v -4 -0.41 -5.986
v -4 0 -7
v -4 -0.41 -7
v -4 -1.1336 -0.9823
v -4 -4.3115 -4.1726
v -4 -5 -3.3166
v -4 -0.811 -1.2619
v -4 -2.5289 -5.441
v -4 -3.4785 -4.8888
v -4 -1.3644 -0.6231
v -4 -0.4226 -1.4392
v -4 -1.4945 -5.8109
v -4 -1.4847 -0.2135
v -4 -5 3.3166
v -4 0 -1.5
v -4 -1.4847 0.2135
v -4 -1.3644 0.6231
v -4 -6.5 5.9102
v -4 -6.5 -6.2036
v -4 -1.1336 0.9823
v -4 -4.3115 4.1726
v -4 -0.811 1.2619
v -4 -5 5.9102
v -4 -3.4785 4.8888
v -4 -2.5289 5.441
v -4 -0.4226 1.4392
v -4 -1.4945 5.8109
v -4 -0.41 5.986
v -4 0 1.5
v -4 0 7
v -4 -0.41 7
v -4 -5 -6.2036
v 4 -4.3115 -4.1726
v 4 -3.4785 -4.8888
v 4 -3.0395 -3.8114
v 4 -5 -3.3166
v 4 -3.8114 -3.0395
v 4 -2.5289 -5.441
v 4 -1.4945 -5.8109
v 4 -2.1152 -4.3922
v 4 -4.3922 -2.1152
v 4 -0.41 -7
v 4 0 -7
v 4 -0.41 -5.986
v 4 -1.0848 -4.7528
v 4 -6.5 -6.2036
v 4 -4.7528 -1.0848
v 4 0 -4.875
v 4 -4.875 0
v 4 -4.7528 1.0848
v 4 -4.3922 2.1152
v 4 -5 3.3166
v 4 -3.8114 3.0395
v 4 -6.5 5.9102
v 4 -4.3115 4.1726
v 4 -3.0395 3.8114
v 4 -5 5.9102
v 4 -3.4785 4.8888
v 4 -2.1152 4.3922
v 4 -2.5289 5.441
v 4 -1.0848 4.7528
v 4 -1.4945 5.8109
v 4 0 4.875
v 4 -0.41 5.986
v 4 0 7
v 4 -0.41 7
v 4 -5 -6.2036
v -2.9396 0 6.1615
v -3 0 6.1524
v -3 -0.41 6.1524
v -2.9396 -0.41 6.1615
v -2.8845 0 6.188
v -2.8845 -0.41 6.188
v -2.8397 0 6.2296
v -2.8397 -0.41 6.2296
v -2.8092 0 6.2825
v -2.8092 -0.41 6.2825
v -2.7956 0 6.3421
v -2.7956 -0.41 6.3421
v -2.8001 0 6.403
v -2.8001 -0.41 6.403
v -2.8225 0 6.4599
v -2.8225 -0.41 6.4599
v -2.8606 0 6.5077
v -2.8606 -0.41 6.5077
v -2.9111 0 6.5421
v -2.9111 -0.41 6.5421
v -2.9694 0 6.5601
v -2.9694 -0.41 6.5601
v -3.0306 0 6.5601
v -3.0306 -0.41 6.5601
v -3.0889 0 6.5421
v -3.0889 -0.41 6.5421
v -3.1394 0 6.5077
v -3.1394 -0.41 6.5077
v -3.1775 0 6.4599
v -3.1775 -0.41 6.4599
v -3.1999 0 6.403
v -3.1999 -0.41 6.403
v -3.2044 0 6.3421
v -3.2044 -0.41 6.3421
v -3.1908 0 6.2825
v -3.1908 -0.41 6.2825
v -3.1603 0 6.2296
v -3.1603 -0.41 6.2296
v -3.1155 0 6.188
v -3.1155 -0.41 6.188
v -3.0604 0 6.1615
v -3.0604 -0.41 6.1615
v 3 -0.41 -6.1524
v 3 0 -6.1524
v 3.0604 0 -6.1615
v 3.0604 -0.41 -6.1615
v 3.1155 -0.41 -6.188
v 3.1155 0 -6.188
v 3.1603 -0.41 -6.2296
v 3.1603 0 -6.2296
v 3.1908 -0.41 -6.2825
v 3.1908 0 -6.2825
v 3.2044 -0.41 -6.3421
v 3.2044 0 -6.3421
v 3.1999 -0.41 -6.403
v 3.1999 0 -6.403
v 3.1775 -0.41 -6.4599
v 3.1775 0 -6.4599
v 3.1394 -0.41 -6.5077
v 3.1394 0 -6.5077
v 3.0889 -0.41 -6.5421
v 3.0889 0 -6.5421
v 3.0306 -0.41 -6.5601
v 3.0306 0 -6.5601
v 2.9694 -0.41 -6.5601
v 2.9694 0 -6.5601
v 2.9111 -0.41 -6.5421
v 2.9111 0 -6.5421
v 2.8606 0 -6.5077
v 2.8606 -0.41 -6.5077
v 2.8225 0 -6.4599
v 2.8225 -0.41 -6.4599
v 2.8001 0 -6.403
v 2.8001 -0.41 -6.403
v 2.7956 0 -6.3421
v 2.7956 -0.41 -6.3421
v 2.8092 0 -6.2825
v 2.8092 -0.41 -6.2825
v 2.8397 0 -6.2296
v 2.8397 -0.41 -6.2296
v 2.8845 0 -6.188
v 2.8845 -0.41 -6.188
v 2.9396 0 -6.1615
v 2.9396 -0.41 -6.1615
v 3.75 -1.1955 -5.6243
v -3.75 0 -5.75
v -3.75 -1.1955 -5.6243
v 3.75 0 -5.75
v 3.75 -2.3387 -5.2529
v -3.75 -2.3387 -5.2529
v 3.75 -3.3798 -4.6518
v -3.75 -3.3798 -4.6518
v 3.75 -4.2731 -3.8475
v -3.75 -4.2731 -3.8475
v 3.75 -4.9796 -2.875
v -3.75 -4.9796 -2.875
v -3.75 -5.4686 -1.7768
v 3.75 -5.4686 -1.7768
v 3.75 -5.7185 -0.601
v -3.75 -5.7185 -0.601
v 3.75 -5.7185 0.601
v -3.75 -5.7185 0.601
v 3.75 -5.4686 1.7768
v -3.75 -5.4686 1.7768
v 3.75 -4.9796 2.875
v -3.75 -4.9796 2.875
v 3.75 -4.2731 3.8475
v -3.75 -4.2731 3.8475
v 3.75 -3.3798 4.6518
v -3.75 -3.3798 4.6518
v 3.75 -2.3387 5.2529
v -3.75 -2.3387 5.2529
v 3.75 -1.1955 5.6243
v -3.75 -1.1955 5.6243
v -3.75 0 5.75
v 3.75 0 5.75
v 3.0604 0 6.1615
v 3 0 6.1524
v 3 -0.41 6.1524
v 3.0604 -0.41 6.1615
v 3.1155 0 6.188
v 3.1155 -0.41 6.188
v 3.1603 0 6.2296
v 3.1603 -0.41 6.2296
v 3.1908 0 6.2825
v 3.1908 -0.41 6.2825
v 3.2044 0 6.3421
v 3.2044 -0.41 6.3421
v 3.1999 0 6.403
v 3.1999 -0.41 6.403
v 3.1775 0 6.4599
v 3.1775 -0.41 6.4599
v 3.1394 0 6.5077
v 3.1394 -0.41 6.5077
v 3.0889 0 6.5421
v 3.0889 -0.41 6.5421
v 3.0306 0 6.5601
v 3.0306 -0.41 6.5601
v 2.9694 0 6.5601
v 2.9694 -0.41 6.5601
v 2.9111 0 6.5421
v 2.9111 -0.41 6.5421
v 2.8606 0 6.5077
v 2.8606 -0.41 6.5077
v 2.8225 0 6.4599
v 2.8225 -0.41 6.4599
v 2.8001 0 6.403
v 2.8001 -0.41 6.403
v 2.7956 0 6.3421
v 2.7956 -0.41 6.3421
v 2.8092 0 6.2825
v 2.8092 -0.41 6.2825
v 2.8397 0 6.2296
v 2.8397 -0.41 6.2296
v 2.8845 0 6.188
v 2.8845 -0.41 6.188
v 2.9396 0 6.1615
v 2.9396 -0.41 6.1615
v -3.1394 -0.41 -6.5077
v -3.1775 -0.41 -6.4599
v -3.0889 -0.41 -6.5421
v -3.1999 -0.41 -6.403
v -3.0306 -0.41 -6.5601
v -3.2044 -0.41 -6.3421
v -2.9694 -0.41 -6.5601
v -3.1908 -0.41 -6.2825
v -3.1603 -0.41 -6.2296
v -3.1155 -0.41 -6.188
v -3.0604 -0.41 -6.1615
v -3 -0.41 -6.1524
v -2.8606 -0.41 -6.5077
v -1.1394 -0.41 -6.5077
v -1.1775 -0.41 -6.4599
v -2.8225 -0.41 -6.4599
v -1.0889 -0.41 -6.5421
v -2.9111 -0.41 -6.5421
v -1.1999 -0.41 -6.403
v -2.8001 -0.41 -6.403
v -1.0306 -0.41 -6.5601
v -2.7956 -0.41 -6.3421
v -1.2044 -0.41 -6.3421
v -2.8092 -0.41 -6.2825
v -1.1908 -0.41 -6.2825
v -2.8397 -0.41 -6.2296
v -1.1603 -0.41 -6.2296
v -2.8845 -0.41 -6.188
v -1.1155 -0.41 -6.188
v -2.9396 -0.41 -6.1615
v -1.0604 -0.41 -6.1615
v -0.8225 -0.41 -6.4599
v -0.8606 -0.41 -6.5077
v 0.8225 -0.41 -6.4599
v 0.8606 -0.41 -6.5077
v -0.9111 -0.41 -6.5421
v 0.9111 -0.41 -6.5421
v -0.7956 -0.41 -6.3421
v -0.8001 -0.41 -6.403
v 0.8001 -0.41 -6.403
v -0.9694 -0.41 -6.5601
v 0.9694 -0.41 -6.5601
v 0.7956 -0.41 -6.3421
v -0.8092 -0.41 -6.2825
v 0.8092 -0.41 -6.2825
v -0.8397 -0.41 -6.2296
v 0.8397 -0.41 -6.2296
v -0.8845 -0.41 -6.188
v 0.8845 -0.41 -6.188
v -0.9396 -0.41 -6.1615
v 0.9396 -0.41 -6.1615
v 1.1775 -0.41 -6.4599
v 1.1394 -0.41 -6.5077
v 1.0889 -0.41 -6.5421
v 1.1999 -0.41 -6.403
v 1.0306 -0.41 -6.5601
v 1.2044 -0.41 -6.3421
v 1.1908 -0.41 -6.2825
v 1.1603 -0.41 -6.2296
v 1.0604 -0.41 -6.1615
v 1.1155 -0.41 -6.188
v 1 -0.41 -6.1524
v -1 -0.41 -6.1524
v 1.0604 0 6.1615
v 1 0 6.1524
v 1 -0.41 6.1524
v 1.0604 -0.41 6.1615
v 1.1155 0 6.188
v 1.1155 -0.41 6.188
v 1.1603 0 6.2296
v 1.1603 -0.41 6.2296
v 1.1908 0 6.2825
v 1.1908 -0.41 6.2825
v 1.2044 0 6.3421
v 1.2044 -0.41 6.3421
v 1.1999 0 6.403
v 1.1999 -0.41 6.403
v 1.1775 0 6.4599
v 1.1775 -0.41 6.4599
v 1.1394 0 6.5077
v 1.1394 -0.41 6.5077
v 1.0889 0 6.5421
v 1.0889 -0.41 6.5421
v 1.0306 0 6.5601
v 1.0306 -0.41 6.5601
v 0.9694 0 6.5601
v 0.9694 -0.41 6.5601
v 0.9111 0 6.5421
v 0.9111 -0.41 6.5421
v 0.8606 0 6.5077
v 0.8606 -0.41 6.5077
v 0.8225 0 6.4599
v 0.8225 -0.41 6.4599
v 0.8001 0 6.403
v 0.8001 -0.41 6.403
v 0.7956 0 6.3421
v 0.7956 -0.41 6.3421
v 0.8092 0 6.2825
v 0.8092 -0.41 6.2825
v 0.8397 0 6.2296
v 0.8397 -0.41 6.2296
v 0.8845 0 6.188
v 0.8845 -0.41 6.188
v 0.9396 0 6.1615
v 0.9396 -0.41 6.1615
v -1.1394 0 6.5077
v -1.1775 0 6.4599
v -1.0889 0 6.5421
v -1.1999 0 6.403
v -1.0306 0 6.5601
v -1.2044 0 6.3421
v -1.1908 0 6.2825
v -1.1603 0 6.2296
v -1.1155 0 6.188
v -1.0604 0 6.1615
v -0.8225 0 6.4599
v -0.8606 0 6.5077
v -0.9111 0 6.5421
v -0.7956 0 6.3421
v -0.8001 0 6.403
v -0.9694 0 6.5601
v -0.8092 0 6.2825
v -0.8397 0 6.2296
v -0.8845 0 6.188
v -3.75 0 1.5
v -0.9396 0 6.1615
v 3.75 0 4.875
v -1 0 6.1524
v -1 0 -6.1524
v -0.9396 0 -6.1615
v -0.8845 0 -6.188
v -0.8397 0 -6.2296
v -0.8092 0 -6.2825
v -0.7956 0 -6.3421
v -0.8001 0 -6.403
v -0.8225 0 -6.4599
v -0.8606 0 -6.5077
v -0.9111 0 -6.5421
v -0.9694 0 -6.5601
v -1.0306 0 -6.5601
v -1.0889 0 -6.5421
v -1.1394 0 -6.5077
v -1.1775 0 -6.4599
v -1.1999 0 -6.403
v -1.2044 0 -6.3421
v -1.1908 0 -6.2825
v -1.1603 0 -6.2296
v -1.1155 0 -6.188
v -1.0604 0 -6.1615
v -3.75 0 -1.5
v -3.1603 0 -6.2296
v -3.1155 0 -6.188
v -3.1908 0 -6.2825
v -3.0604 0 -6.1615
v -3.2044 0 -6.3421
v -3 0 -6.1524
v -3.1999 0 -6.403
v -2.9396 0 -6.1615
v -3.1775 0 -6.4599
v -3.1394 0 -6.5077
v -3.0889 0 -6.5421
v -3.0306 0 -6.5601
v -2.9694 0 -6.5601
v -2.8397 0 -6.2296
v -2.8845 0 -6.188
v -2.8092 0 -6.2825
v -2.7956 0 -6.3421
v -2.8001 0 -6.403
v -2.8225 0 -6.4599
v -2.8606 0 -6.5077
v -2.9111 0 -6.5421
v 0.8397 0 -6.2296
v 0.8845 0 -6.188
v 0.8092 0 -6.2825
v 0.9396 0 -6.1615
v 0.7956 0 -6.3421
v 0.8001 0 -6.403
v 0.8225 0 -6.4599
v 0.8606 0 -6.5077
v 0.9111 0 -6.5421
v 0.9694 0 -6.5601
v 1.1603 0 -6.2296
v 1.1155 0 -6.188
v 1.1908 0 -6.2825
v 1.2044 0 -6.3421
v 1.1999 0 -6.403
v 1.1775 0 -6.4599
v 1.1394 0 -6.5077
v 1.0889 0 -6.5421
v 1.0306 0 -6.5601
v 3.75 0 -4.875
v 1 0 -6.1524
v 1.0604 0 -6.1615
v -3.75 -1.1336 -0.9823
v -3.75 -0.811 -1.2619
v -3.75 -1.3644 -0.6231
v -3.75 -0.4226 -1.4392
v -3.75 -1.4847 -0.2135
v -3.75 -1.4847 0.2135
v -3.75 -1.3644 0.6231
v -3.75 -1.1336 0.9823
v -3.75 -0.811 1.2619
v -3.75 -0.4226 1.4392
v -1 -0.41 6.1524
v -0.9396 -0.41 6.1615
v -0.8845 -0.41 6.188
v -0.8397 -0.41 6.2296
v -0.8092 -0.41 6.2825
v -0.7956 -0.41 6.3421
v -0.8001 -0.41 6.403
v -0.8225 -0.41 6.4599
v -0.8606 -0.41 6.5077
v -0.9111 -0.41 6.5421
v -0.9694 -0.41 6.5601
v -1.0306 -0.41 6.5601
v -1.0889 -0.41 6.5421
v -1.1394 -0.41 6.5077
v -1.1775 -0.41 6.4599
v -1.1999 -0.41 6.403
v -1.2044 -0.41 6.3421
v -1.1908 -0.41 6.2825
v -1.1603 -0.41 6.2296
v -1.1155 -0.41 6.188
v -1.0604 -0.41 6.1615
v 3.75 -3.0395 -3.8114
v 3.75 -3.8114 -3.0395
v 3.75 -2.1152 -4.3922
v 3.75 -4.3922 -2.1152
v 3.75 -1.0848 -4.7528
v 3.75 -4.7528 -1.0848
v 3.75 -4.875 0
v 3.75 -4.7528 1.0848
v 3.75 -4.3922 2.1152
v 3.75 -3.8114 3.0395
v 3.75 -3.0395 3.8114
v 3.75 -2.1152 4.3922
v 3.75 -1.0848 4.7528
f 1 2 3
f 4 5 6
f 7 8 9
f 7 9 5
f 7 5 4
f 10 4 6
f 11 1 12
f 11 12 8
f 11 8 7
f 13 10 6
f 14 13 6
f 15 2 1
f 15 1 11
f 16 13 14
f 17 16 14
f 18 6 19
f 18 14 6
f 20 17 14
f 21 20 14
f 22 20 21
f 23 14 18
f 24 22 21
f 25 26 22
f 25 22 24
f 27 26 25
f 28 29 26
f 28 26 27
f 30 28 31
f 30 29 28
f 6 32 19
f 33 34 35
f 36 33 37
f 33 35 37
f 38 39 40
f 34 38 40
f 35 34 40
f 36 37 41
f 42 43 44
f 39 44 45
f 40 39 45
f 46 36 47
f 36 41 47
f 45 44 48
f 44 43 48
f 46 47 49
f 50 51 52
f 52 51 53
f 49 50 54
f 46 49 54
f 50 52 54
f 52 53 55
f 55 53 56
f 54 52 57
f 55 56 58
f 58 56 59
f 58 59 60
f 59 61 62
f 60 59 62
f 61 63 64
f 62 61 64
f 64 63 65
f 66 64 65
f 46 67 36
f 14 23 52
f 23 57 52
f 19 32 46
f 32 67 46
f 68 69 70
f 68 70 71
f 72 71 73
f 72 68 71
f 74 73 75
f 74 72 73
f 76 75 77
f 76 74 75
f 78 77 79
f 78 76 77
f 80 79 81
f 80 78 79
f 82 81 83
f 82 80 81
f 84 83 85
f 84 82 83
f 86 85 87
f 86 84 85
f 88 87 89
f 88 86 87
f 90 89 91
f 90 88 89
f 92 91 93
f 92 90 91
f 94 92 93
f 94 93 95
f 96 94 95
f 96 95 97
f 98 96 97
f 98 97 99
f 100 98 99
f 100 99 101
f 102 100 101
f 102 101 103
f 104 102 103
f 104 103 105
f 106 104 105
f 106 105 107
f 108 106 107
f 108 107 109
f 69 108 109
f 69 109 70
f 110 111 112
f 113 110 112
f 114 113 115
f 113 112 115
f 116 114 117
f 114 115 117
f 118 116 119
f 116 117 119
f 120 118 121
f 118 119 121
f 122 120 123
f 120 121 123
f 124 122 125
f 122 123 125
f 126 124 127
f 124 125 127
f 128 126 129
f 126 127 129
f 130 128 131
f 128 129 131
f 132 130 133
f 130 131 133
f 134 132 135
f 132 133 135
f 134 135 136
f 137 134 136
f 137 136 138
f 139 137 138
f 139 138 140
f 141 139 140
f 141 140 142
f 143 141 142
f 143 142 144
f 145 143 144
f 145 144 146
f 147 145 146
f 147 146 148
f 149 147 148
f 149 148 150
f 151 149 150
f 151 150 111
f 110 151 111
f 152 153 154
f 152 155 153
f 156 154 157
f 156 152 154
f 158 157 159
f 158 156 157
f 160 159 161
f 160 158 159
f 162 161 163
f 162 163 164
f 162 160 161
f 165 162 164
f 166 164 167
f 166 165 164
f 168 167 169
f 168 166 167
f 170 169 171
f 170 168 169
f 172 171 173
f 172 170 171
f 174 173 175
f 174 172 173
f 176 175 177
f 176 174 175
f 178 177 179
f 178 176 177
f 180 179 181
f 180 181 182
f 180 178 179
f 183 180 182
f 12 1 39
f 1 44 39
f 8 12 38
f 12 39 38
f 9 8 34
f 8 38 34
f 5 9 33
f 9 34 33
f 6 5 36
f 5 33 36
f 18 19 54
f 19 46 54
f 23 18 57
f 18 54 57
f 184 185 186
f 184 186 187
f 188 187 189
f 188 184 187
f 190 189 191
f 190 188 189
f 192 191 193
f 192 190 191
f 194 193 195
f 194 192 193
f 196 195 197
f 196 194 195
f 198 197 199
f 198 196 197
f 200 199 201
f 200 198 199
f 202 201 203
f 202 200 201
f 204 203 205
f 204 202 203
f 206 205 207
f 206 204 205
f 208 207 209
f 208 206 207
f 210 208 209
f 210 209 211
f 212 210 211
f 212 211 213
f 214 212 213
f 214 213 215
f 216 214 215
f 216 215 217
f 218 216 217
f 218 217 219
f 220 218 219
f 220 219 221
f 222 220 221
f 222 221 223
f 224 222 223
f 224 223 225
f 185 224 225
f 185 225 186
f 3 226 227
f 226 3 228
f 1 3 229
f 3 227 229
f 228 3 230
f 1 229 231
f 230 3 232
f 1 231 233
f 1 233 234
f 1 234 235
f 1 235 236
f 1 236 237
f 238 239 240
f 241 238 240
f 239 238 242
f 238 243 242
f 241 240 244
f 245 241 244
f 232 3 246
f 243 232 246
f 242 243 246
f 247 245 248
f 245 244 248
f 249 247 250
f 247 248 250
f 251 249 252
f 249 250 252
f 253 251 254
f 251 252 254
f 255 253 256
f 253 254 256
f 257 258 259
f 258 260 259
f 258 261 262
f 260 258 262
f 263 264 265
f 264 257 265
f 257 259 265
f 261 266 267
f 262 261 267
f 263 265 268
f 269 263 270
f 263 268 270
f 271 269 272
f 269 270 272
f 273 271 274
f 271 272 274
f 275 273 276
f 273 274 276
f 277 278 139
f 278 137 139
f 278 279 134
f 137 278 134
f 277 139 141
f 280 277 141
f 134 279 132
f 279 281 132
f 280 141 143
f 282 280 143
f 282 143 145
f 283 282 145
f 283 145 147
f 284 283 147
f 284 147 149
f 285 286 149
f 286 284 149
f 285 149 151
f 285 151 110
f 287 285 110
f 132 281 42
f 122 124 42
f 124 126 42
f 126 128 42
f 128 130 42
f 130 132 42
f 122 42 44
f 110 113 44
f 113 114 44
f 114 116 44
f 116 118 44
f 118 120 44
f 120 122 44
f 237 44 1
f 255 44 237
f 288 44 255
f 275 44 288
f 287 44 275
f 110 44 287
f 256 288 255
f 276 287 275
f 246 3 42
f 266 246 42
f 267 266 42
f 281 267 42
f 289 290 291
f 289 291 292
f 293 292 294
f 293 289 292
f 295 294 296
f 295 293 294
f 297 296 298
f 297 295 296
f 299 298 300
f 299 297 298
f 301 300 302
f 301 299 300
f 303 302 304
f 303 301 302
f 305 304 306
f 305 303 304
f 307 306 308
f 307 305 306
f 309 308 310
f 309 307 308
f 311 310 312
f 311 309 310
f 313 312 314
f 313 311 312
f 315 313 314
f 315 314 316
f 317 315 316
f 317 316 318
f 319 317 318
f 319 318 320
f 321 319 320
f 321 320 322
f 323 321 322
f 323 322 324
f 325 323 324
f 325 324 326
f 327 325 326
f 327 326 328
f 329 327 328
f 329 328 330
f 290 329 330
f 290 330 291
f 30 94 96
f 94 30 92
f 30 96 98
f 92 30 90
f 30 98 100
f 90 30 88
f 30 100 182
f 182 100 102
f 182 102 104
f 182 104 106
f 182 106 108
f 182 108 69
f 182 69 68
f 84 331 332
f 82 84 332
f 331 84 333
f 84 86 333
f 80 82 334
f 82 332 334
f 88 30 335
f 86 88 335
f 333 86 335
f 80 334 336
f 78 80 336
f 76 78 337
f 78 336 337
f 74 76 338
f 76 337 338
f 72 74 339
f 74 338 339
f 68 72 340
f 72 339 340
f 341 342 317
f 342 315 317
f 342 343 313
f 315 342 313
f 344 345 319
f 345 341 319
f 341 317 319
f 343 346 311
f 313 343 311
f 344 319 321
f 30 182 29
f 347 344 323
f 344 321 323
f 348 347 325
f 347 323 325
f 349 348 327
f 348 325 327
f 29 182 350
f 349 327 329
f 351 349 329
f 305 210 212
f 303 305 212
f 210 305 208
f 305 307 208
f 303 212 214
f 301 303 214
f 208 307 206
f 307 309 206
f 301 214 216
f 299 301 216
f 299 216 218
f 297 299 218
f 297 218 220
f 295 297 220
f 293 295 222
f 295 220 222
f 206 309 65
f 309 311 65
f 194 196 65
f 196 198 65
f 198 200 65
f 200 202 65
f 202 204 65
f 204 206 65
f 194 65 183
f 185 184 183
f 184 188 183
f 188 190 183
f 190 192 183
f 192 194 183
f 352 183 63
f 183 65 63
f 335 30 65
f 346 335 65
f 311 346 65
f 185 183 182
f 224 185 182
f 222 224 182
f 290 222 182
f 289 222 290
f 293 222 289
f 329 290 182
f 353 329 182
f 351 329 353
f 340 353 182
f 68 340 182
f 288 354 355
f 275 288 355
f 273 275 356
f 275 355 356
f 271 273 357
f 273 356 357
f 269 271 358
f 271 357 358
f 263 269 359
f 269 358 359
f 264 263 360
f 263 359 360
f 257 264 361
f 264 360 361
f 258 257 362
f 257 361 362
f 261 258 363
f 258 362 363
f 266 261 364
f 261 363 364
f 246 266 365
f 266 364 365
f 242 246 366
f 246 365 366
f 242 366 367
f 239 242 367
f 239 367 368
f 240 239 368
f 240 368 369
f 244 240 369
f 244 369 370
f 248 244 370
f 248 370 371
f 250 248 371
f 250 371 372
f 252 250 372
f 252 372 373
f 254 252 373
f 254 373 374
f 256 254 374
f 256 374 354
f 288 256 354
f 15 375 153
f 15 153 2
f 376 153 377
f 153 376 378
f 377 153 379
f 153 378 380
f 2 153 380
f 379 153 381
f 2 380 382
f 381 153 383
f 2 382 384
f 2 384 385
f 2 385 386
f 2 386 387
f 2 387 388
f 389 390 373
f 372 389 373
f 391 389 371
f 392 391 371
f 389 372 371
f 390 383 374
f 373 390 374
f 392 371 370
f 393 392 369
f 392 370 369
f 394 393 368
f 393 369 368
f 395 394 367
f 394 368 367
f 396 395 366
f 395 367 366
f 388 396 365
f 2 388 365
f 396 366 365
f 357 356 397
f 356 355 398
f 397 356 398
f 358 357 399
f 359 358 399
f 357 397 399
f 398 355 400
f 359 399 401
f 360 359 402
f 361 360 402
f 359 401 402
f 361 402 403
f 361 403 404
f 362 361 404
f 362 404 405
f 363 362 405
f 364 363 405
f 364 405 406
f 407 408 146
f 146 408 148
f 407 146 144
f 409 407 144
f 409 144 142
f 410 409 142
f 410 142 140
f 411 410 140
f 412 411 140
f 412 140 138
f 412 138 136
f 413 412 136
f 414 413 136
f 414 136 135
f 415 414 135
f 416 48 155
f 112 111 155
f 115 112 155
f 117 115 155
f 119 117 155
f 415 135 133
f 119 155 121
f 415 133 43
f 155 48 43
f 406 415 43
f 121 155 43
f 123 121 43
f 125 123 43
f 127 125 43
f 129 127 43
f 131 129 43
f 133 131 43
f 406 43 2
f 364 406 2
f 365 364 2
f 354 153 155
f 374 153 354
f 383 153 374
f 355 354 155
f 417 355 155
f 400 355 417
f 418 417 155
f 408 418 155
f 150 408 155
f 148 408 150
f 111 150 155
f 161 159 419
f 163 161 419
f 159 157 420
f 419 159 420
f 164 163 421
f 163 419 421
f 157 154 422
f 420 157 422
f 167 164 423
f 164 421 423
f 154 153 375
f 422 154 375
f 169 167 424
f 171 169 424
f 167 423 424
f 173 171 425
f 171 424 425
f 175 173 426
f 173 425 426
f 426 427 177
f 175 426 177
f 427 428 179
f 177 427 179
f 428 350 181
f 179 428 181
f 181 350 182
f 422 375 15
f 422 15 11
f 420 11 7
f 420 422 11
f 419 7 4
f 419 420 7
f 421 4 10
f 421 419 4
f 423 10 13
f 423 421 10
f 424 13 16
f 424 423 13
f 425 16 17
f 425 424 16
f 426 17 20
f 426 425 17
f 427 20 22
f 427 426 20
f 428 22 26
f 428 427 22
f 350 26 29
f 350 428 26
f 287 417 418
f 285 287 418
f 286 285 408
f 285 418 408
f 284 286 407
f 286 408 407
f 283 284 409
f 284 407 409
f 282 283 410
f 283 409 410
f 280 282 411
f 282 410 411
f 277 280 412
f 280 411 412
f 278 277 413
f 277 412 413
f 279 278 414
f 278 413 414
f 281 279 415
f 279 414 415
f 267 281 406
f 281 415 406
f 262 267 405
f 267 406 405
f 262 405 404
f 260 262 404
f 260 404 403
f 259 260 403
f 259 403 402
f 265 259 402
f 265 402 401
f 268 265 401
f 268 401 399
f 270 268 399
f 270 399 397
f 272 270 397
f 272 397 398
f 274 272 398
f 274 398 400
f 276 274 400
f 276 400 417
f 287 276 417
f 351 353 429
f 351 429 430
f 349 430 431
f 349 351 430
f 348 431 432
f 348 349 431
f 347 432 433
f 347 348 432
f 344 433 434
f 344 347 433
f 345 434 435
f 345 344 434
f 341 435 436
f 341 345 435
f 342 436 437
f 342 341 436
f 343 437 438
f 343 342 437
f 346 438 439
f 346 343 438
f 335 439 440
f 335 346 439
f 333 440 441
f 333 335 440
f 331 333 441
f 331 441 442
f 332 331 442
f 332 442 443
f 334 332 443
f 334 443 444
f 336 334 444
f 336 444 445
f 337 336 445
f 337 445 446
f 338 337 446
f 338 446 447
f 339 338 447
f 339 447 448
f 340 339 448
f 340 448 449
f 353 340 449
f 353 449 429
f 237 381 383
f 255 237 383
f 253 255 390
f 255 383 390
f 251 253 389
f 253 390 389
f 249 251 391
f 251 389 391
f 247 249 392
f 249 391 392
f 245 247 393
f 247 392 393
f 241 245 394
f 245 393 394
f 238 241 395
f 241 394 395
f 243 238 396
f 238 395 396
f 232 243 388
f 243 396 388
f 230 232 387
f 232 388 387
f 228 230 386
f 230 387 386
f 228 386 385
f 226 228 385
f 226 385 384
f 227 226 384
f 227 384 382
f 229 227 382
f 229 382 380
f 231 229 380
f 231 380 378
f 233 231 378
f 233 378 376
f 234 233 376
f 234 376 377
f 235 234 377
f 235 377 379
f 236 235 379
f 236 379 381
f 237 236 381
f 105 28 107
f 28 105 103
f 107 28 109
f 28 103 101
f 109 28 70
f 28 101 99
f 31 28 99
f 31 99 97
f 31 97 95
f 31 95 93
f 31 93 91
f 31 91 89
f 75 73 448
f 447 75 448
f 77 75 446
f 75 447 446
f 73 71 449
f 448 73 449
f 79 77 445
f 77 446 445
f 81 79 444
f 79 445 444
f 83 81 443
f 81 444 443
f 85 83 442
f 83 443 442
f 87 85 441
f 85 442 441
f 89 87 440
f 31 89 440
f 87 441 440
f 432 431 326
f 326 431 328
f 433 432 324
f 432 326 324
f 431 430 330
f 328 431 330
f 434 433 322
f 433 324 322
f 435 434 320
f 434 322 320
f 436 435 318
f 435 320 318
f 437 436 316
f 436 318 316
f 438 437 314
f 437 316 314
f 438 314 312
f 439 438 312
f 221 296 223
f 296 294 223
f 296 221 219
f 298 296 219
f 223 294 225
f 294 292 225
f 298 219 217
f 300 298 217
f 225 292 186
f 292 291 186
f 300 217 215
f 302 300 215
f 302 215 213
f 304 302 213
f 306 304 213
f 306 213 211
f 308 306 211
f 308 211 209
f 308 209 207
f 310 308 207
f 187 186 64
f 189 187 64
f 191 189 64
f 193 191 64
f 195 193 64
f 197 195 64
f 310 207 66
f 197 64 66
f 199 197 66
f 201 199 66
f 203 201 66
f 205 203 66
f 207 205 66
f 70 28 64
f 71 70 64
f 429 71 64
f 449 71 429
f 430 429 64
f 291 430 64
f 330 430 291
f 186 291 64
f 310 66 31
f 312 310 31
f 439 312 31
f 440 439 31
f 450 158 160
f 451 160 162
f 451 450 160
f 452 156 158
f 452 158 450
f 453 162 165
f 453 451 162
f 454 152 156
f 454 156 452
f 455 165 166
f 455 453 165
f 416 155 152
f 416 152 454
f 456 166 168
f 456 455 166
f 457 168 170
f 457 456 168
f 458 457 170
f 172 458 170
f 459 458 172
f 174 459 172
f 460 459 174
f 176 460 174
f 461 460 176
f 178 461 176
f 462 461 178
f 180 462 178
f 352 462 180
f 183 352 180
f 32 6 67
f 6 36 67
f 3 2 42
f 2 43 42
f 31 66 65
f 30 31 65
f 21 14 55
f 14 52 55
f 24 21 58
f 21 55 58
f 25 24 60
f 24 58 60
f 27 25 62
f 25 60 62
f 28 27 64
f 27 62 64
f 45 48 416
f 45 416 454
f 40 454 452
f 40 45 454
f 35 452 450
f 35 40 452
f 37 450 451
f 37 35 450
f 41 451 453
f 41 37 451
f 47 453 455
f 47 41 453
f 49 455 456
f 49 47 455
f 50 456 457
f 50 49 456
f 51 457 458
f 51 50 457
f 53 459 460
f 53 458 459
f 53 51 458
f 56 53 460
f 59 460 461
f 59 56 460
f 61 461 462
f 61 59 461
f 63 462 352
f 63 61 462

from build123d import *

# Parameters (mm, degrees)
BOSS_EXTRUDE1_DEPTH = 4
CUT_EXTRUDE1_DEPTH  = 3.75
CUT_EXTRUDE2_REACH  = 14.46
CUT_EXTRUDE3_REACH  = 14.301
CUT_EXTRUDE4_REACH  = 12.356
SKETCH6_R           = 0.205


with BuildPart() as part:
    # Sketch1 → Boss-Extrude1 (new, symmetric)
    with BuildSketch(Plane(origin=(0, 0, 0), x_dir=(0, 0, -1), z_dir=(1, 0, 0))):
        with BuildLine():
            Line((-7, 0), (7, 0))
            Line((7, 0), (7, -0.41))
            Line((7, -0.41), (5.985975276, -0.41))
            ThreePointArc((5.985975276, -0.41), (5.186676874, -3.016352599), (3.31662479, -5))
            Line((3.31662479, -5), (6.203592814, -5))
            Line((6.203592814, -5), (6.203592814, -6.5))
            Line((6.203592814, -6.5), (-5.910179641, -6.5))
            Line((-5.910179641, -6.5), (-5.910179641, -5))
            Line((-5.910179641, -5), (-3.31662479, -5))
            ThreePointArc((-3.31662479, -5), (-5.186676874, -3.016352599), (-5.985975276, -0.41))
            Line((-5.985975276, -0.41), (-7, -0.41))
            Line((-7, -0.41), (-7, 0))
        make_face()
    extrude(amount=BOSS_EXTRUDE1_DEPTH, both=True)

    # Sketch2 → Cut-Extrude1 (cut, symmetric)
    with BuildSketch(Plane(origin=(0, 0, 0), x_dir=(0, 0, -1), z_dir=(1, 0, 0))):
        with BuildLine():
            Line((-5.75, 0), (5.75, 0))
            ThreePointArc((5.75, 0), (0, -5.75), (-5.75, 0))
        make_face()
    extrude(amount=CUT_EXTRUDE1_DEPTH, both=True, mode=Mode.SUBTRACT)

    # Sketch3 → Cut-Extrude2 (cut, up to next)
    with BuildSketch(Plane(origin=(4, 0, 0), x_dir=(0, 0, -1), z_dir=(1, 0, 0)), mode=Mode.PRIVATE) as cut_extrude2_sk1:
        with BuildLine():
            Line((-4.875, 0), (4.875, 0))
            ThreePointArc((4.875, 0), (0, -4.875), (-4.875, 0))
        make_face()
    cut_extrude2_tool1 = extrude(cut_extrude2_sk1.sketch, amount=-CUT_EXTRUDE2_REACH, mode=Mode.PRIVATE) & part.part
    add(cut_extrude2_tool1.solids().sort_by_distance((4, -2.069014, 0))[0], mode=Mode.SUBTRACT)

    # Sketch4 → Cut-Extrude3 (cut, up to next)
    with BuildSketch(Plane(origin=(-3.75, 0, 0), x_dir=(0, 0, -1), z_dir=(1, 0, 0)), mode=Mode.PRIVATE) as cut_extrude3_sk1:
        with BuildLine():
            Line((-1.5, 0), (1.5, 0))
            ThreePointArc((1.5, 0), (0, -1.5), (-1.5, 0))
        make_face()
    cut_extrude3_tool1 = extrude(cut_extrude3_sk1.sketch, amount=-CUT_EXTRUDE3_REACH, mode=Mode.PRIVATE) & part.part
    add(cut_extrude3_tool1.solids().sort_by_distance((-3.75, -0.63662, 0))[0], mode=Mode.SUBTRACT)

    # Sketch6 → Cut-Extrude4 (cut, up to next)
    with BuildSketch(Plane(origin=(0, 0, 0), x_dir=(1, 0, 0), z_dir=(0, 1, 0)), mode=Mode.PRIVATE) as cut_extrude4_sk1:
        with Locations(Location((3, 6.357400892, 0), (0, 0, 270))):
            Circle(SKETCH6_R)
    cut_extrude4_tool1 = extrude(cut_extrude4_sk1.sketch, amount=-CUT_EXTRUDE4_REACH, mode=Mode.PRIVATE) & part.part
    # Sketch6 → Cut-Extrude4 (cut, up to next)
    with BuildSketch(Plane(origin=(0, 0, 0), x_dir=(1, 0, 0), z_dir=(0, 1, 0)), mode=Mode.PRIVATE) as cut_extrude4_sk2:
        with Locations(Location((1, 6.357400892, 0), (0, 0, 270))):
            Circle(SKETCH6_R)
    cut_extrude4_tool2 = extrude(cut_extrude4_sk2.sketch, amount=-CUT_EXTRUDE4_REACH, mode=Mode.PRIVATE) & part.part
    # Sketch6 → Cut-Extrude4 (cut, up to next)
    with BuildSketch(Plane(origin=(0, 0, 0), x_dir=(1, 0, 0), z_dir=(0, 1, 0)), mode=Mode.PRIVATE) as cut_extrude4_sk3:
        with Locations(Location((-1, 6.357400892, 0), (0, 0, 270))):
            Circle(SKETCH6_R)
    cut_extrude4_tool3 = extrude(cut_extrude4_sk3.sketch, amount=-CUT_EXTRUDE4_REACH, mode=Mode.PRIVATE) & part.part
    # Sketch6 → Cut-Extrude4 (cut, up to next)
    with BuildSketch(Plane(origin=(0, 0, 0), x_dir=(1, 0, 0), z_dir=(0, 1, 0)), mode=Mode.PRIVATE) as cut_extrude4_sk4:
        with Locations(Location((-3, 6.357400892, 0), (0, 0, 270))):
            Circle(SKETCH6_R)
    cut_extrude4_tool4 = extrude(cut_extrude4_sk4.sketch, amount=-CUT_EXTRUDE4_REACH, mode=Mode.PRIVATE) & part.part
    cut_extrude4_1 = cut_extrude4_tool1.solids().sort_by_distance((3, 0, -6.357401))[0]
    add(cut_extrude4_1, mode=Mode.SUBTRACT)
    cut_extrude4_2 = cut_extrude4_tool2.solids().sort_by_distance((1, 0, -6.357401))[0]
    add(cut_extrude4_2, mode=Mode.SUBTRACT)
    cut_extrude4_3 = cut_extrude4_tool3.solids().sort_by_distance((-1, 0, -6.357401))[0]
    add(cut_extrude4_3, mode=Mode.SUBTRACT)
    cut_extrude4_4 = cut_extrude4_tool4.solids().sort_by_distance((-3, 0, -6.357401))[0]
    add(cut_extrude4_4, mode=Mode.SUBTRACT)
    cut_extrude4 = cut_extrude4_1 + cut_extrude4_2 + cut_extrude4_3 + cut_extrude4_4  # Cut-Extrude4 as one shape, for the pattern or mirror that repeats it

    # Mirror1: Cut-Extrude4 across plane
    add(cut_extrude4.mirror(Plane.XY), mode=Mode.SUBTRACT)


solid = part.part
